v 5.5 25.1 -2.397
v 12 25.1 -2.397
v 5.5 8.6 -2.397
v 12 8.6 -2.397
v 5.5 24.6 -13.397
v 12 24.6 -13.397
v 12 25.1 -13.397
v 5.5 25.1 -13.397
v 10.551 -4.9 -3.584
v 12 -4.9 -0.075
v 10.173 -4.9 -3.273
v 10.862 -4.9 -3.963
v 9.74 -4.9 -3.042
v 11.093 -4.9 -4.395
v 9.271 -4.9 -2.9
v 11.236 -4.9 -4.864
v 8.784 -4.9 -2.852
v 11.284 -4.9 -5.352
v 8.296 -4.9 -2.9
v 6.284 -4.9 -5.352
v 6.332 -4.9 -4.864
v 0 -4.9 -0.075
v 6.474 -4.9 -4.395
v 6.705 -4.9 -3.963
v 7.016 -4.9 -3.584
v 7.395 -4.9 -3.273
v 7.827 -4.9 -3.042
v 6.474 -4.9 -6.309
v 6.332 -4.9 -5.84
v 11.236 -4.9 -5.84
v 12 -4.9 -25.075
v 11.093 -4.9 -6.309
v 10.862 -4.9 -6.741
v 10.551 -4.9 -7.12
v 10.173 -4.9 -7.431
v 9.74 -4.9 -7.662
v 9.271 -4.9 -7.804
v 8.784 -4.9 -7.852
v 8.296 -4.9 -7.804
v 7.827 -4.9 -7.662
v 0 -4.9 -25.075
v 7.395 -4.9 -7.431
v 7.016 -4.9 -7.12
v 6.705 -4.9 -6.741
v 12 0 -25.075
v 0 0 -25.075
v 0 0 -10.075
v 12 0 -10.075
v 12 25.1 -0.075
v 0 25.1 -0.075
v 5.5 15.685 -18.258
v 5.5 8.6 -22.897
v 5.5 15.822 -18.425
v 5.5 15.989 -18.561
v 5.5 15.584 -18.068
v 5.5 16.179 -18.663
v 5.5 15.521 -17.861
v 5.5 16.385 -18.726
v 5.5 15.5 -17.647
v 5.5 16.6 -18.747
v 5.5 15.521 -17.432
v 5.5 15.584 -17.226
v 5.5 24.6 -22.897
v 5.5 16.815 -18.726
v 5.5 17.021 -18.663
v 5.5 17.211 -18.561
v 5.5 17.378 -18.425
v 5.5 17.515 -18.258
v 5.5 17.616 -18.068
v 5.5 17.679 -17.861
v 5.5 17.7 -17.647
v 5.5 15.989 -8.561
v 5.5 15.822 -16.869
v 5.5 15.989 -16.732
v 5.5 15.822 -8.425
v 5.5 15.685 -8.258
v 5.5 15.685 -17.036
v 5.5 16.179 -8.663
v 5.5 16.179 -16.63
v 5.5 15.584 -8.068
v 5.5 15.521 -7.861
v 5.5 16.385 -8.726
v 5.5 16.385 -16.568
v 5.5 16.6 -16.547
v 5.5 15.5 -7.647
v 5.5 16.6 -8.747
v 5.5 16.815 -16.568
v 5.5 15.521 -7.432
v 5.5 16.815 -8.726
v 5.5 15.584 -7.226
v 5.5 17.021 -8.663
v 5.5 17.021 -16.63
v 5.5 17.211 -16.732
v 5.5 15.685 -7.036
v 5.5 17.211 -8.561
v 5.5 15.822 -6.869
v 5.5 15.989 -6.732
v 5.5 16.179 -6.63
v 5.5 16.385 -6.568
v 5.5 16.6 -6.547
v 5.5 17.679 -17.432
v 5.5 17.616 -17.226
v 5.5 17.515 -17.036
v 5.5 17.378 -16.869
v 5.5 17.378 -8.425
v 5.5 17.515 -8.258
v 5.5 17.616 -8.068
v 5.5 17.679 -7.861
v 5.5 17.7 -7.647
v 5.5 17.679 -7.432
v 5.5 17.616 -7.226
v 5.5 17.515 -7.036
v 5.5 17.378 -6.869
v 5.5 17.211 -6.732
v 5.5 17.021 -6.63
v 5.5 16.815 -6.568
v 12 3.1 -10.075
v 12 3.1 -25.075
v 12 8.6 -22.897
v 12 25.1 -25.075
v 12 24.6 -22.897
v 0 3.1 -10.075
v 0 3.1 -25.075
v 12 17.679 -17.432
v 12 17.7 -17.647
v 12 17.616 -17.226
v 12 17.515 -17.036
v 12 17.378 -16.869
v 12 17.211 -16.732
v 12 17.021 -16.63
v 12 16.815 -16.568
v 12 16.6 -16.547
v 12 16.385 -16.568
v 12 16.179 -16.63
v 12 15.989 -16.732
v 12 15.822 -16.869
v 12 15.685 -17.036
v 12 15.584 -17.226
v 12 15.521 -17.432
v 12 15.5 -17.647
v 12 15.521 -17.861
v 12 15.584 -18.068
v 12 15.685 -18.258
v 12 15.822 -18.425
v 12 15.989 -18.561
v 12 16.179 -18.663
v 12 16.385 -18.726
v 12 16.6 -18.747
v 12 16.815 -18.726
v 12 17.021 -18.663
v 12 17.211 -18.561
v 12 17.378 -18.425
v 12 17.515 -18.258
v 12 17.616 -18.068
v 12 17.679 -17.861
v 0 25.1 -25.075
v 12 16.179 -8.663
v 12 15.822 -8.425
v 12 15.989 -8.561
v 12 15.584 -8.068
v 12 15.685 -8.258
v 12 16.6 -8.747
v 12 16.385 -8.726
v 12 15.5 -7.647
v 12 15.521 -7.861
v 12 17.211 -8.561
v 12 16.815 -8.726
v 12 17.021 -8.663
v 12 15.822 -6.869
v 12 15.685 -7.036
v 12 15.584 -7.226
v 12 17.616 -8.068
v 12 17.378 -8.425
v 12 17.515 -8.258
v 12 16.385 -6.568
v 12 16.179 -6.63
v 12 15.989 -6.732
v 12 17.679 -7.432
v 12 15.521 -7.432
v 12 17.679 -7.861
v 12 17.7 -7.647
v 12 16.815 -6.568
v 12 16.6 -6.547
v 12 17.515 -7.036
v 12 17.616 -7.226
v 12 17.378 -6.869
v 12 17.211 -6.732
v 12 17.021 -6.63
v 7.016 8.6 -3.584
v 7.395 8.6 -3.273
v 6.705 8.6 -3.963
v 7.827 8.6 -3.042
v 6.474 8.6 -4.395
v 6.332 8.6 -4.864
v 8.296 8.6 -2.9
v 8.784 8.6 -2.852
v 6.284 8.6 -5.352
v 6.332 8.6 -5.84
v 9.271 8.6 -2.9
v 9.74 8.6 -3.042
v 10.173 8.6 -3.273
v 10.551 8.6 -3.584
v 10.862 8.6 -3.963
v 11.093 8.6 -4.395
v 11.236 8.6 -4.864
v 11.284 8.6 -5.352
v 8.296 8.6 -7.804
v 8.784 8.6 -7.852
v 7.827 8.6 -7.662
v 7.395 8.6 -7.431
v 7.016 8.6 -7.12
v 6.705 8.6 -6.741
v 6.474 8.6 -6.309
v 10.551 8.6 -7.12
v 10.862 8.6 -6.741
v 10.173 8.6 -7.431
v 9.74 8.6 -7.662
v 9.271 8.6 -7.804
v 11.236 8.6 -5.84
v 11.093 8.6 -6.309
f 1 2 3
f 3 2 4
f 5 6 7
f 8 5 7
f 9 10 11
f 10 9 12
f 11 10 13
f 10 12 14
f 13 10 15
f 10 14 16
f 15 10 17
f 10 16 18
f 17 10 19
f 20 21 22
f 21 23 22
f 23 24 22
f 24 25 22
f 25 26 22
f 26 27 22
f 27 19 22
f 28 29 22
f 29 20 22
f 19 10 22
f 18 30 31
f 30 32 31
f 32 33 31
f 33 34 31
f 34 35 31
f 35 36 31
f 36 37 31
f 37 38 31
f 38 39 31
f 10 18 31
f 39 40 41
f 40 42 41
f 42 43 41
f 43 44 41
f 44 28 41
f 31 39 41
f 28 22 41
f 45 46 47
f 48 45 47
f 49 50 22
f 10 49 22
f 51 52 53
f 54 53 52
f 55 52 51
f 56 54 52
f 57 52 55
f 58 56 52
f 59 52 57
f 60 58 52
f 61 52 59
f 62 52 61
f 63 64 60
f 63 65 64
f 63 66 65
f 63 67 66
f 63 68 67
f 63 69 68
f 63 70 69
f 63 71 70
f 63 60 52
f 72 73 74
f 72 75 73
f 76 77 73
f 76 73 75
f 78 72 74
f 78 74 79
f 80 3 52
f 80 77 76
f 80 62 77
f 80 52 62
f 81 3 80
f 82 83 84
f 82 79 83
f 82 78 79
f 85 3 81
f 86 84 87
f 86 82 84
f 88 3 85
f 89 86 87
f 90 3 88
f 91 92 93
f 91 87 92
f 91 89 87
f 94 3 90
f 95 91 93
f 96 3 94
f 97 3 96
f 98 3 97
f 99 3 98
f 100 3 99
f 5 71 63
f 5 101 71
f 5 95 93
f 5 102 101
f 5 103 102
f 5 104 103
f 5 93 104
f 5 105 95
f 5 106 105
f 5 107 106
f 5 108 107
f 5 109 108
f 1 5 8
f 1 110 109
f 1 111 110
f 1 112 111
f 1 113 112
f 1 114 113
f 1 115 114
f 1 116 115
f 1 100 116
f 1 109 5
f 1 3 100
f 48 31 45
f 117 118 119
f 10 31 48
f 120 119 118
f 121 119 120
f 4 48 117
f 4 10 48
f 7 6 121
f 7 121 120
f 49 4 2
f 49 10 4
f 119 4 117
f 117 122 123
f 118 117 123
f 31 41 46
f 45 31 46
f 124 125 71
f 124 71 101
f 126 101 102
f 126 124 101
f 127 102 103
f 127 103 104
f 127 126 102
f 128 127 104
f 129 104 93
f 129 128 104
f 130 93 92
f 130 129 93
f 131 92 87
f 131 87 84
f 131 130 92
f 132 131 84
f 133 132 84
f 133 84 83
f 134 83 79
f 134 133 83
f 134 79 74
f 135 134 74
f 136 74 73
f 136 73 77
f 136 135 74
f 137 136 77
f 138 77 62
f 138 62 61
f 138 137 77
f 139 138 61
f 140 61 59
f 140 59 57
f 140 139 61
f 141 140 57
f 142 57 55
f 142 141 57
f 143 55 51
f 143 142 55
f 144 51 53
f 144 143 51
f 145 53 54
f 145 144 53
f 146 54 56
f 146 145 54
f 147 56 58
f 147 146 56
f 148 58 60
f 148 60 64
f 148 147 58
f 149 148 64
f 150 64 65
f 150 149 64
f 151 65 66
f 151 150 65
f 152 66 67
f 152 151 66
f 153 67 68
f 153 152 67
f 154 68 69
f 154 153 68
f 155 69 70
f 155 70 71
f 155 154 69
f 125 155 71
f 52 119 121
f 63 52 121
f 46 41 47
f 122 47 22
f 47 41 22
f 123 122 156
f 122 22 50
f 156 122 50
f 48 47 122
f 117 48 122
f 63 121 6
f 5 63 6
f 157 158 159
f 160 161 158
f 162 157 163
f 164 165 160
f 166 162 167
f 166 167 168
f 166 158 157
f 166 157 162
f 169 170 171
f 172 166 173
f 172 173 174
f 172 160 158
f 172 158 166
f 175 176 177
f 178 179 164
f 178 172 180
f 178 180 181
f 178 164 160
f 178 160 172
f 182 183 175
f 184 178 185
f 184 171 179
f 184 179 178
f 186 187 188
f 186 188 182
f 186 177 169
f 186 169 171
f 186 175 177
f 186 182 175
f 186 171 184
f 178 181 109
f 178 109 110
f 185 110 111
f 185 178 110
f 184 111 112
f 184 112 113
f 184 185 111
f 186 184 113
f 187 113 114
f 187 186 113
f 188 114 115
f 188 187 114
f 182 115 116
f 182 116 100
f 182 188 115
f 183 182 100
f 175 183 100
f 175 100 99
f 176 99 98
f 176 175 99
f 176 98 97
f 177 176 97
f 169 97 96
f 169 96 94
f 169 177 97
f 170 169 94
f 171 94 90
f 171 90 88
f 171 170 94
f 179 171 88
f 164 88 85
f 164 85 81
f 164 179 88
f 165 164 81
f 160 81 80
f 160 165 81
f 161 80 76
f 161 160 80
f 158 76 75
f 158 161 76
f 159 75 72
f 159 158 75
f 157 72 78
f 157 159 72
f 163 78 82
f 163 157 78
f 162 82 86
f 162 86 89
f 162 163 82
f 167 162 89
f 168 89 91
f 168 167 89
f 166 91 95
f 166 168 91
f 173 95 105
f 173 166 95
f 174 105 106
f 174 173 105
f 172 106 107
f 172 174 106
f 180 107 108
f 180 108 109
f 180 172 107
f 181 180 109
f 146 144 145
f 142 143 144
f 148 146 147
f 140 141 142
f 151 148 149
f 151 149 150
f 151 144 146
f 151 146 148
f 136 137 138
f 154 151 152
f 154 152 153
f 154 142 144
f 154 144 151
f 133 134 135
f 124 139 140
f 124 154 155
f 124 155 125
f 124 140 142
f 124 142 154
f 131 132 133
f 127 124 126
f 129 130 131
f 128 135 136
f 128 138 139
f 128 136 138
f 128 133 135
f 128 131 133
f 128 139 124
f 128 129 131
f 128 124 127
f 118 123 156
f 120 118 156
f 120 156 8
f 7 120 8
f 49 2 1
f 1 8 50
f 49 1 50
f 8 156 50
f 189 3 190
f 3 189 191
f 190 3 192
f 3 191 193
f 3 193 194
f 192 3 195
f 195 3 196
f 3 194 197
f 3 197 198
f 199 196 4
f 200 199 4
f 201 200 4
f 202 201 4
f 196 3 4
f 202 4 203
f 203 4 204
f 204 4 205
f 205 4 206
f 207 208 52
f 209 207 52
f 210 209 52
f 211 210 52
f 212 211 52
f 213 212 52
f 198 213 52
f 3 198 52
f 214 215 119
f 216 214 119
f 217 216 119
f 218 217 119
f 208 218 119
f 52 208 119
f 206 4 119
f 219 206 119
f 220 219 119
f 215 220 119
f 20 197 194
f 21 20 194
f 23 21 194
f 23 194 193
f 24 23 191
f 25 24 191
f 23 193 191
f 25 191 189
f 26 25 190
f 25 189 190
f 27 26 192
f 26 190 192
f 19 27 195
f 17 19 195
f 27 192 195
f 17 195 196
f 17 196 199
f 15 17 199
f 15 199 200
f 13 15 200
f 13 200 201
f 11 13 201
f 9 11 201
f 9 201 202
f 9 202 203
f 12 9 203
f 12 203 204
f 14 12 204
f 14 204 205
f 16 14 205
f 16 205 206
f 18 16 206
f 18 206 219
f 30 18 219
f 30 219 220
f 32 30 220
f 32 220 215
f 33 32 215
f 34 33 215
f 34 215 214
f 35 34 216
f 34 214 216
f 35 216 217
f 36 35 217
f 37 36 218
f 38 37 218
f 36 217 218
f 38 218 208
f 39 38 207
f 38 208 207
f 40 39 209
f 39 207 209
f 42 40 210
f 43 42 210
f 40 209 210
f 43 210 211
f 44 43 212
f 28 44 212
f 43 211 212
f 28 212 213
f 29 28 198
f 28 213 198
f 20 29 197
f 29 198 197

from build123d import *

# Parameters (mm, degrees)
F1_DEPTH = 12
F2_R     = 1.1
F3_DEPTH = 6.5
F4_R     = 2.5
F5_DEPTH = 25


with BuildPart() as f1:
    # F0 (on Right) → F1 (new body)
    with BuildSketch(Plane.YZ):
        Polygon((25.1, -0.075058), (-4.9, -0.075058), (-4.9, -25.075058), (0, -25.075058), (0, -10.075058), (3.1, -10.075058), (3.1, -25.075058), (25.1, -25.075058), align=None)
    extrude(amount=F1_DEPTH)

    # F2 (on face) → F3 (cut)
    with BuildSketch(Plane.YZ.offset(12)):
        Polygon((24.6, -2.396713), (8.6, -2.396713), (8.6, -22.896713), (24.6, -22.896713), (24.6, -13.396713), (28.479045, -13.396713), (28.479045, -2.396713), align=None)
        with Locations((16.6, -17.646713)):
            Circle(F2_R, mode=Mode.SUBTRACT)
        with Locations((16.6, -7.646713)):
            Circle(F2_R, mode=Mode.SUBTRACT)
    extrude(amount=-F3_DEPTH, mode=Mode.SUBTRACT)

    # F4 (on face) → F5 (cut)
    with BuildSketch(Plane(origin=(0, 8.6, 0), x_dir=(-1, 0, 0), z_dir=(0, 1, 0))):
        with Locations((-8.783709, -5.351877)):
            Circle(F4_R)
    extrude(amount=-F5_DEPTH, mode=Mode.SUBTRACT)


solid = f1.part
